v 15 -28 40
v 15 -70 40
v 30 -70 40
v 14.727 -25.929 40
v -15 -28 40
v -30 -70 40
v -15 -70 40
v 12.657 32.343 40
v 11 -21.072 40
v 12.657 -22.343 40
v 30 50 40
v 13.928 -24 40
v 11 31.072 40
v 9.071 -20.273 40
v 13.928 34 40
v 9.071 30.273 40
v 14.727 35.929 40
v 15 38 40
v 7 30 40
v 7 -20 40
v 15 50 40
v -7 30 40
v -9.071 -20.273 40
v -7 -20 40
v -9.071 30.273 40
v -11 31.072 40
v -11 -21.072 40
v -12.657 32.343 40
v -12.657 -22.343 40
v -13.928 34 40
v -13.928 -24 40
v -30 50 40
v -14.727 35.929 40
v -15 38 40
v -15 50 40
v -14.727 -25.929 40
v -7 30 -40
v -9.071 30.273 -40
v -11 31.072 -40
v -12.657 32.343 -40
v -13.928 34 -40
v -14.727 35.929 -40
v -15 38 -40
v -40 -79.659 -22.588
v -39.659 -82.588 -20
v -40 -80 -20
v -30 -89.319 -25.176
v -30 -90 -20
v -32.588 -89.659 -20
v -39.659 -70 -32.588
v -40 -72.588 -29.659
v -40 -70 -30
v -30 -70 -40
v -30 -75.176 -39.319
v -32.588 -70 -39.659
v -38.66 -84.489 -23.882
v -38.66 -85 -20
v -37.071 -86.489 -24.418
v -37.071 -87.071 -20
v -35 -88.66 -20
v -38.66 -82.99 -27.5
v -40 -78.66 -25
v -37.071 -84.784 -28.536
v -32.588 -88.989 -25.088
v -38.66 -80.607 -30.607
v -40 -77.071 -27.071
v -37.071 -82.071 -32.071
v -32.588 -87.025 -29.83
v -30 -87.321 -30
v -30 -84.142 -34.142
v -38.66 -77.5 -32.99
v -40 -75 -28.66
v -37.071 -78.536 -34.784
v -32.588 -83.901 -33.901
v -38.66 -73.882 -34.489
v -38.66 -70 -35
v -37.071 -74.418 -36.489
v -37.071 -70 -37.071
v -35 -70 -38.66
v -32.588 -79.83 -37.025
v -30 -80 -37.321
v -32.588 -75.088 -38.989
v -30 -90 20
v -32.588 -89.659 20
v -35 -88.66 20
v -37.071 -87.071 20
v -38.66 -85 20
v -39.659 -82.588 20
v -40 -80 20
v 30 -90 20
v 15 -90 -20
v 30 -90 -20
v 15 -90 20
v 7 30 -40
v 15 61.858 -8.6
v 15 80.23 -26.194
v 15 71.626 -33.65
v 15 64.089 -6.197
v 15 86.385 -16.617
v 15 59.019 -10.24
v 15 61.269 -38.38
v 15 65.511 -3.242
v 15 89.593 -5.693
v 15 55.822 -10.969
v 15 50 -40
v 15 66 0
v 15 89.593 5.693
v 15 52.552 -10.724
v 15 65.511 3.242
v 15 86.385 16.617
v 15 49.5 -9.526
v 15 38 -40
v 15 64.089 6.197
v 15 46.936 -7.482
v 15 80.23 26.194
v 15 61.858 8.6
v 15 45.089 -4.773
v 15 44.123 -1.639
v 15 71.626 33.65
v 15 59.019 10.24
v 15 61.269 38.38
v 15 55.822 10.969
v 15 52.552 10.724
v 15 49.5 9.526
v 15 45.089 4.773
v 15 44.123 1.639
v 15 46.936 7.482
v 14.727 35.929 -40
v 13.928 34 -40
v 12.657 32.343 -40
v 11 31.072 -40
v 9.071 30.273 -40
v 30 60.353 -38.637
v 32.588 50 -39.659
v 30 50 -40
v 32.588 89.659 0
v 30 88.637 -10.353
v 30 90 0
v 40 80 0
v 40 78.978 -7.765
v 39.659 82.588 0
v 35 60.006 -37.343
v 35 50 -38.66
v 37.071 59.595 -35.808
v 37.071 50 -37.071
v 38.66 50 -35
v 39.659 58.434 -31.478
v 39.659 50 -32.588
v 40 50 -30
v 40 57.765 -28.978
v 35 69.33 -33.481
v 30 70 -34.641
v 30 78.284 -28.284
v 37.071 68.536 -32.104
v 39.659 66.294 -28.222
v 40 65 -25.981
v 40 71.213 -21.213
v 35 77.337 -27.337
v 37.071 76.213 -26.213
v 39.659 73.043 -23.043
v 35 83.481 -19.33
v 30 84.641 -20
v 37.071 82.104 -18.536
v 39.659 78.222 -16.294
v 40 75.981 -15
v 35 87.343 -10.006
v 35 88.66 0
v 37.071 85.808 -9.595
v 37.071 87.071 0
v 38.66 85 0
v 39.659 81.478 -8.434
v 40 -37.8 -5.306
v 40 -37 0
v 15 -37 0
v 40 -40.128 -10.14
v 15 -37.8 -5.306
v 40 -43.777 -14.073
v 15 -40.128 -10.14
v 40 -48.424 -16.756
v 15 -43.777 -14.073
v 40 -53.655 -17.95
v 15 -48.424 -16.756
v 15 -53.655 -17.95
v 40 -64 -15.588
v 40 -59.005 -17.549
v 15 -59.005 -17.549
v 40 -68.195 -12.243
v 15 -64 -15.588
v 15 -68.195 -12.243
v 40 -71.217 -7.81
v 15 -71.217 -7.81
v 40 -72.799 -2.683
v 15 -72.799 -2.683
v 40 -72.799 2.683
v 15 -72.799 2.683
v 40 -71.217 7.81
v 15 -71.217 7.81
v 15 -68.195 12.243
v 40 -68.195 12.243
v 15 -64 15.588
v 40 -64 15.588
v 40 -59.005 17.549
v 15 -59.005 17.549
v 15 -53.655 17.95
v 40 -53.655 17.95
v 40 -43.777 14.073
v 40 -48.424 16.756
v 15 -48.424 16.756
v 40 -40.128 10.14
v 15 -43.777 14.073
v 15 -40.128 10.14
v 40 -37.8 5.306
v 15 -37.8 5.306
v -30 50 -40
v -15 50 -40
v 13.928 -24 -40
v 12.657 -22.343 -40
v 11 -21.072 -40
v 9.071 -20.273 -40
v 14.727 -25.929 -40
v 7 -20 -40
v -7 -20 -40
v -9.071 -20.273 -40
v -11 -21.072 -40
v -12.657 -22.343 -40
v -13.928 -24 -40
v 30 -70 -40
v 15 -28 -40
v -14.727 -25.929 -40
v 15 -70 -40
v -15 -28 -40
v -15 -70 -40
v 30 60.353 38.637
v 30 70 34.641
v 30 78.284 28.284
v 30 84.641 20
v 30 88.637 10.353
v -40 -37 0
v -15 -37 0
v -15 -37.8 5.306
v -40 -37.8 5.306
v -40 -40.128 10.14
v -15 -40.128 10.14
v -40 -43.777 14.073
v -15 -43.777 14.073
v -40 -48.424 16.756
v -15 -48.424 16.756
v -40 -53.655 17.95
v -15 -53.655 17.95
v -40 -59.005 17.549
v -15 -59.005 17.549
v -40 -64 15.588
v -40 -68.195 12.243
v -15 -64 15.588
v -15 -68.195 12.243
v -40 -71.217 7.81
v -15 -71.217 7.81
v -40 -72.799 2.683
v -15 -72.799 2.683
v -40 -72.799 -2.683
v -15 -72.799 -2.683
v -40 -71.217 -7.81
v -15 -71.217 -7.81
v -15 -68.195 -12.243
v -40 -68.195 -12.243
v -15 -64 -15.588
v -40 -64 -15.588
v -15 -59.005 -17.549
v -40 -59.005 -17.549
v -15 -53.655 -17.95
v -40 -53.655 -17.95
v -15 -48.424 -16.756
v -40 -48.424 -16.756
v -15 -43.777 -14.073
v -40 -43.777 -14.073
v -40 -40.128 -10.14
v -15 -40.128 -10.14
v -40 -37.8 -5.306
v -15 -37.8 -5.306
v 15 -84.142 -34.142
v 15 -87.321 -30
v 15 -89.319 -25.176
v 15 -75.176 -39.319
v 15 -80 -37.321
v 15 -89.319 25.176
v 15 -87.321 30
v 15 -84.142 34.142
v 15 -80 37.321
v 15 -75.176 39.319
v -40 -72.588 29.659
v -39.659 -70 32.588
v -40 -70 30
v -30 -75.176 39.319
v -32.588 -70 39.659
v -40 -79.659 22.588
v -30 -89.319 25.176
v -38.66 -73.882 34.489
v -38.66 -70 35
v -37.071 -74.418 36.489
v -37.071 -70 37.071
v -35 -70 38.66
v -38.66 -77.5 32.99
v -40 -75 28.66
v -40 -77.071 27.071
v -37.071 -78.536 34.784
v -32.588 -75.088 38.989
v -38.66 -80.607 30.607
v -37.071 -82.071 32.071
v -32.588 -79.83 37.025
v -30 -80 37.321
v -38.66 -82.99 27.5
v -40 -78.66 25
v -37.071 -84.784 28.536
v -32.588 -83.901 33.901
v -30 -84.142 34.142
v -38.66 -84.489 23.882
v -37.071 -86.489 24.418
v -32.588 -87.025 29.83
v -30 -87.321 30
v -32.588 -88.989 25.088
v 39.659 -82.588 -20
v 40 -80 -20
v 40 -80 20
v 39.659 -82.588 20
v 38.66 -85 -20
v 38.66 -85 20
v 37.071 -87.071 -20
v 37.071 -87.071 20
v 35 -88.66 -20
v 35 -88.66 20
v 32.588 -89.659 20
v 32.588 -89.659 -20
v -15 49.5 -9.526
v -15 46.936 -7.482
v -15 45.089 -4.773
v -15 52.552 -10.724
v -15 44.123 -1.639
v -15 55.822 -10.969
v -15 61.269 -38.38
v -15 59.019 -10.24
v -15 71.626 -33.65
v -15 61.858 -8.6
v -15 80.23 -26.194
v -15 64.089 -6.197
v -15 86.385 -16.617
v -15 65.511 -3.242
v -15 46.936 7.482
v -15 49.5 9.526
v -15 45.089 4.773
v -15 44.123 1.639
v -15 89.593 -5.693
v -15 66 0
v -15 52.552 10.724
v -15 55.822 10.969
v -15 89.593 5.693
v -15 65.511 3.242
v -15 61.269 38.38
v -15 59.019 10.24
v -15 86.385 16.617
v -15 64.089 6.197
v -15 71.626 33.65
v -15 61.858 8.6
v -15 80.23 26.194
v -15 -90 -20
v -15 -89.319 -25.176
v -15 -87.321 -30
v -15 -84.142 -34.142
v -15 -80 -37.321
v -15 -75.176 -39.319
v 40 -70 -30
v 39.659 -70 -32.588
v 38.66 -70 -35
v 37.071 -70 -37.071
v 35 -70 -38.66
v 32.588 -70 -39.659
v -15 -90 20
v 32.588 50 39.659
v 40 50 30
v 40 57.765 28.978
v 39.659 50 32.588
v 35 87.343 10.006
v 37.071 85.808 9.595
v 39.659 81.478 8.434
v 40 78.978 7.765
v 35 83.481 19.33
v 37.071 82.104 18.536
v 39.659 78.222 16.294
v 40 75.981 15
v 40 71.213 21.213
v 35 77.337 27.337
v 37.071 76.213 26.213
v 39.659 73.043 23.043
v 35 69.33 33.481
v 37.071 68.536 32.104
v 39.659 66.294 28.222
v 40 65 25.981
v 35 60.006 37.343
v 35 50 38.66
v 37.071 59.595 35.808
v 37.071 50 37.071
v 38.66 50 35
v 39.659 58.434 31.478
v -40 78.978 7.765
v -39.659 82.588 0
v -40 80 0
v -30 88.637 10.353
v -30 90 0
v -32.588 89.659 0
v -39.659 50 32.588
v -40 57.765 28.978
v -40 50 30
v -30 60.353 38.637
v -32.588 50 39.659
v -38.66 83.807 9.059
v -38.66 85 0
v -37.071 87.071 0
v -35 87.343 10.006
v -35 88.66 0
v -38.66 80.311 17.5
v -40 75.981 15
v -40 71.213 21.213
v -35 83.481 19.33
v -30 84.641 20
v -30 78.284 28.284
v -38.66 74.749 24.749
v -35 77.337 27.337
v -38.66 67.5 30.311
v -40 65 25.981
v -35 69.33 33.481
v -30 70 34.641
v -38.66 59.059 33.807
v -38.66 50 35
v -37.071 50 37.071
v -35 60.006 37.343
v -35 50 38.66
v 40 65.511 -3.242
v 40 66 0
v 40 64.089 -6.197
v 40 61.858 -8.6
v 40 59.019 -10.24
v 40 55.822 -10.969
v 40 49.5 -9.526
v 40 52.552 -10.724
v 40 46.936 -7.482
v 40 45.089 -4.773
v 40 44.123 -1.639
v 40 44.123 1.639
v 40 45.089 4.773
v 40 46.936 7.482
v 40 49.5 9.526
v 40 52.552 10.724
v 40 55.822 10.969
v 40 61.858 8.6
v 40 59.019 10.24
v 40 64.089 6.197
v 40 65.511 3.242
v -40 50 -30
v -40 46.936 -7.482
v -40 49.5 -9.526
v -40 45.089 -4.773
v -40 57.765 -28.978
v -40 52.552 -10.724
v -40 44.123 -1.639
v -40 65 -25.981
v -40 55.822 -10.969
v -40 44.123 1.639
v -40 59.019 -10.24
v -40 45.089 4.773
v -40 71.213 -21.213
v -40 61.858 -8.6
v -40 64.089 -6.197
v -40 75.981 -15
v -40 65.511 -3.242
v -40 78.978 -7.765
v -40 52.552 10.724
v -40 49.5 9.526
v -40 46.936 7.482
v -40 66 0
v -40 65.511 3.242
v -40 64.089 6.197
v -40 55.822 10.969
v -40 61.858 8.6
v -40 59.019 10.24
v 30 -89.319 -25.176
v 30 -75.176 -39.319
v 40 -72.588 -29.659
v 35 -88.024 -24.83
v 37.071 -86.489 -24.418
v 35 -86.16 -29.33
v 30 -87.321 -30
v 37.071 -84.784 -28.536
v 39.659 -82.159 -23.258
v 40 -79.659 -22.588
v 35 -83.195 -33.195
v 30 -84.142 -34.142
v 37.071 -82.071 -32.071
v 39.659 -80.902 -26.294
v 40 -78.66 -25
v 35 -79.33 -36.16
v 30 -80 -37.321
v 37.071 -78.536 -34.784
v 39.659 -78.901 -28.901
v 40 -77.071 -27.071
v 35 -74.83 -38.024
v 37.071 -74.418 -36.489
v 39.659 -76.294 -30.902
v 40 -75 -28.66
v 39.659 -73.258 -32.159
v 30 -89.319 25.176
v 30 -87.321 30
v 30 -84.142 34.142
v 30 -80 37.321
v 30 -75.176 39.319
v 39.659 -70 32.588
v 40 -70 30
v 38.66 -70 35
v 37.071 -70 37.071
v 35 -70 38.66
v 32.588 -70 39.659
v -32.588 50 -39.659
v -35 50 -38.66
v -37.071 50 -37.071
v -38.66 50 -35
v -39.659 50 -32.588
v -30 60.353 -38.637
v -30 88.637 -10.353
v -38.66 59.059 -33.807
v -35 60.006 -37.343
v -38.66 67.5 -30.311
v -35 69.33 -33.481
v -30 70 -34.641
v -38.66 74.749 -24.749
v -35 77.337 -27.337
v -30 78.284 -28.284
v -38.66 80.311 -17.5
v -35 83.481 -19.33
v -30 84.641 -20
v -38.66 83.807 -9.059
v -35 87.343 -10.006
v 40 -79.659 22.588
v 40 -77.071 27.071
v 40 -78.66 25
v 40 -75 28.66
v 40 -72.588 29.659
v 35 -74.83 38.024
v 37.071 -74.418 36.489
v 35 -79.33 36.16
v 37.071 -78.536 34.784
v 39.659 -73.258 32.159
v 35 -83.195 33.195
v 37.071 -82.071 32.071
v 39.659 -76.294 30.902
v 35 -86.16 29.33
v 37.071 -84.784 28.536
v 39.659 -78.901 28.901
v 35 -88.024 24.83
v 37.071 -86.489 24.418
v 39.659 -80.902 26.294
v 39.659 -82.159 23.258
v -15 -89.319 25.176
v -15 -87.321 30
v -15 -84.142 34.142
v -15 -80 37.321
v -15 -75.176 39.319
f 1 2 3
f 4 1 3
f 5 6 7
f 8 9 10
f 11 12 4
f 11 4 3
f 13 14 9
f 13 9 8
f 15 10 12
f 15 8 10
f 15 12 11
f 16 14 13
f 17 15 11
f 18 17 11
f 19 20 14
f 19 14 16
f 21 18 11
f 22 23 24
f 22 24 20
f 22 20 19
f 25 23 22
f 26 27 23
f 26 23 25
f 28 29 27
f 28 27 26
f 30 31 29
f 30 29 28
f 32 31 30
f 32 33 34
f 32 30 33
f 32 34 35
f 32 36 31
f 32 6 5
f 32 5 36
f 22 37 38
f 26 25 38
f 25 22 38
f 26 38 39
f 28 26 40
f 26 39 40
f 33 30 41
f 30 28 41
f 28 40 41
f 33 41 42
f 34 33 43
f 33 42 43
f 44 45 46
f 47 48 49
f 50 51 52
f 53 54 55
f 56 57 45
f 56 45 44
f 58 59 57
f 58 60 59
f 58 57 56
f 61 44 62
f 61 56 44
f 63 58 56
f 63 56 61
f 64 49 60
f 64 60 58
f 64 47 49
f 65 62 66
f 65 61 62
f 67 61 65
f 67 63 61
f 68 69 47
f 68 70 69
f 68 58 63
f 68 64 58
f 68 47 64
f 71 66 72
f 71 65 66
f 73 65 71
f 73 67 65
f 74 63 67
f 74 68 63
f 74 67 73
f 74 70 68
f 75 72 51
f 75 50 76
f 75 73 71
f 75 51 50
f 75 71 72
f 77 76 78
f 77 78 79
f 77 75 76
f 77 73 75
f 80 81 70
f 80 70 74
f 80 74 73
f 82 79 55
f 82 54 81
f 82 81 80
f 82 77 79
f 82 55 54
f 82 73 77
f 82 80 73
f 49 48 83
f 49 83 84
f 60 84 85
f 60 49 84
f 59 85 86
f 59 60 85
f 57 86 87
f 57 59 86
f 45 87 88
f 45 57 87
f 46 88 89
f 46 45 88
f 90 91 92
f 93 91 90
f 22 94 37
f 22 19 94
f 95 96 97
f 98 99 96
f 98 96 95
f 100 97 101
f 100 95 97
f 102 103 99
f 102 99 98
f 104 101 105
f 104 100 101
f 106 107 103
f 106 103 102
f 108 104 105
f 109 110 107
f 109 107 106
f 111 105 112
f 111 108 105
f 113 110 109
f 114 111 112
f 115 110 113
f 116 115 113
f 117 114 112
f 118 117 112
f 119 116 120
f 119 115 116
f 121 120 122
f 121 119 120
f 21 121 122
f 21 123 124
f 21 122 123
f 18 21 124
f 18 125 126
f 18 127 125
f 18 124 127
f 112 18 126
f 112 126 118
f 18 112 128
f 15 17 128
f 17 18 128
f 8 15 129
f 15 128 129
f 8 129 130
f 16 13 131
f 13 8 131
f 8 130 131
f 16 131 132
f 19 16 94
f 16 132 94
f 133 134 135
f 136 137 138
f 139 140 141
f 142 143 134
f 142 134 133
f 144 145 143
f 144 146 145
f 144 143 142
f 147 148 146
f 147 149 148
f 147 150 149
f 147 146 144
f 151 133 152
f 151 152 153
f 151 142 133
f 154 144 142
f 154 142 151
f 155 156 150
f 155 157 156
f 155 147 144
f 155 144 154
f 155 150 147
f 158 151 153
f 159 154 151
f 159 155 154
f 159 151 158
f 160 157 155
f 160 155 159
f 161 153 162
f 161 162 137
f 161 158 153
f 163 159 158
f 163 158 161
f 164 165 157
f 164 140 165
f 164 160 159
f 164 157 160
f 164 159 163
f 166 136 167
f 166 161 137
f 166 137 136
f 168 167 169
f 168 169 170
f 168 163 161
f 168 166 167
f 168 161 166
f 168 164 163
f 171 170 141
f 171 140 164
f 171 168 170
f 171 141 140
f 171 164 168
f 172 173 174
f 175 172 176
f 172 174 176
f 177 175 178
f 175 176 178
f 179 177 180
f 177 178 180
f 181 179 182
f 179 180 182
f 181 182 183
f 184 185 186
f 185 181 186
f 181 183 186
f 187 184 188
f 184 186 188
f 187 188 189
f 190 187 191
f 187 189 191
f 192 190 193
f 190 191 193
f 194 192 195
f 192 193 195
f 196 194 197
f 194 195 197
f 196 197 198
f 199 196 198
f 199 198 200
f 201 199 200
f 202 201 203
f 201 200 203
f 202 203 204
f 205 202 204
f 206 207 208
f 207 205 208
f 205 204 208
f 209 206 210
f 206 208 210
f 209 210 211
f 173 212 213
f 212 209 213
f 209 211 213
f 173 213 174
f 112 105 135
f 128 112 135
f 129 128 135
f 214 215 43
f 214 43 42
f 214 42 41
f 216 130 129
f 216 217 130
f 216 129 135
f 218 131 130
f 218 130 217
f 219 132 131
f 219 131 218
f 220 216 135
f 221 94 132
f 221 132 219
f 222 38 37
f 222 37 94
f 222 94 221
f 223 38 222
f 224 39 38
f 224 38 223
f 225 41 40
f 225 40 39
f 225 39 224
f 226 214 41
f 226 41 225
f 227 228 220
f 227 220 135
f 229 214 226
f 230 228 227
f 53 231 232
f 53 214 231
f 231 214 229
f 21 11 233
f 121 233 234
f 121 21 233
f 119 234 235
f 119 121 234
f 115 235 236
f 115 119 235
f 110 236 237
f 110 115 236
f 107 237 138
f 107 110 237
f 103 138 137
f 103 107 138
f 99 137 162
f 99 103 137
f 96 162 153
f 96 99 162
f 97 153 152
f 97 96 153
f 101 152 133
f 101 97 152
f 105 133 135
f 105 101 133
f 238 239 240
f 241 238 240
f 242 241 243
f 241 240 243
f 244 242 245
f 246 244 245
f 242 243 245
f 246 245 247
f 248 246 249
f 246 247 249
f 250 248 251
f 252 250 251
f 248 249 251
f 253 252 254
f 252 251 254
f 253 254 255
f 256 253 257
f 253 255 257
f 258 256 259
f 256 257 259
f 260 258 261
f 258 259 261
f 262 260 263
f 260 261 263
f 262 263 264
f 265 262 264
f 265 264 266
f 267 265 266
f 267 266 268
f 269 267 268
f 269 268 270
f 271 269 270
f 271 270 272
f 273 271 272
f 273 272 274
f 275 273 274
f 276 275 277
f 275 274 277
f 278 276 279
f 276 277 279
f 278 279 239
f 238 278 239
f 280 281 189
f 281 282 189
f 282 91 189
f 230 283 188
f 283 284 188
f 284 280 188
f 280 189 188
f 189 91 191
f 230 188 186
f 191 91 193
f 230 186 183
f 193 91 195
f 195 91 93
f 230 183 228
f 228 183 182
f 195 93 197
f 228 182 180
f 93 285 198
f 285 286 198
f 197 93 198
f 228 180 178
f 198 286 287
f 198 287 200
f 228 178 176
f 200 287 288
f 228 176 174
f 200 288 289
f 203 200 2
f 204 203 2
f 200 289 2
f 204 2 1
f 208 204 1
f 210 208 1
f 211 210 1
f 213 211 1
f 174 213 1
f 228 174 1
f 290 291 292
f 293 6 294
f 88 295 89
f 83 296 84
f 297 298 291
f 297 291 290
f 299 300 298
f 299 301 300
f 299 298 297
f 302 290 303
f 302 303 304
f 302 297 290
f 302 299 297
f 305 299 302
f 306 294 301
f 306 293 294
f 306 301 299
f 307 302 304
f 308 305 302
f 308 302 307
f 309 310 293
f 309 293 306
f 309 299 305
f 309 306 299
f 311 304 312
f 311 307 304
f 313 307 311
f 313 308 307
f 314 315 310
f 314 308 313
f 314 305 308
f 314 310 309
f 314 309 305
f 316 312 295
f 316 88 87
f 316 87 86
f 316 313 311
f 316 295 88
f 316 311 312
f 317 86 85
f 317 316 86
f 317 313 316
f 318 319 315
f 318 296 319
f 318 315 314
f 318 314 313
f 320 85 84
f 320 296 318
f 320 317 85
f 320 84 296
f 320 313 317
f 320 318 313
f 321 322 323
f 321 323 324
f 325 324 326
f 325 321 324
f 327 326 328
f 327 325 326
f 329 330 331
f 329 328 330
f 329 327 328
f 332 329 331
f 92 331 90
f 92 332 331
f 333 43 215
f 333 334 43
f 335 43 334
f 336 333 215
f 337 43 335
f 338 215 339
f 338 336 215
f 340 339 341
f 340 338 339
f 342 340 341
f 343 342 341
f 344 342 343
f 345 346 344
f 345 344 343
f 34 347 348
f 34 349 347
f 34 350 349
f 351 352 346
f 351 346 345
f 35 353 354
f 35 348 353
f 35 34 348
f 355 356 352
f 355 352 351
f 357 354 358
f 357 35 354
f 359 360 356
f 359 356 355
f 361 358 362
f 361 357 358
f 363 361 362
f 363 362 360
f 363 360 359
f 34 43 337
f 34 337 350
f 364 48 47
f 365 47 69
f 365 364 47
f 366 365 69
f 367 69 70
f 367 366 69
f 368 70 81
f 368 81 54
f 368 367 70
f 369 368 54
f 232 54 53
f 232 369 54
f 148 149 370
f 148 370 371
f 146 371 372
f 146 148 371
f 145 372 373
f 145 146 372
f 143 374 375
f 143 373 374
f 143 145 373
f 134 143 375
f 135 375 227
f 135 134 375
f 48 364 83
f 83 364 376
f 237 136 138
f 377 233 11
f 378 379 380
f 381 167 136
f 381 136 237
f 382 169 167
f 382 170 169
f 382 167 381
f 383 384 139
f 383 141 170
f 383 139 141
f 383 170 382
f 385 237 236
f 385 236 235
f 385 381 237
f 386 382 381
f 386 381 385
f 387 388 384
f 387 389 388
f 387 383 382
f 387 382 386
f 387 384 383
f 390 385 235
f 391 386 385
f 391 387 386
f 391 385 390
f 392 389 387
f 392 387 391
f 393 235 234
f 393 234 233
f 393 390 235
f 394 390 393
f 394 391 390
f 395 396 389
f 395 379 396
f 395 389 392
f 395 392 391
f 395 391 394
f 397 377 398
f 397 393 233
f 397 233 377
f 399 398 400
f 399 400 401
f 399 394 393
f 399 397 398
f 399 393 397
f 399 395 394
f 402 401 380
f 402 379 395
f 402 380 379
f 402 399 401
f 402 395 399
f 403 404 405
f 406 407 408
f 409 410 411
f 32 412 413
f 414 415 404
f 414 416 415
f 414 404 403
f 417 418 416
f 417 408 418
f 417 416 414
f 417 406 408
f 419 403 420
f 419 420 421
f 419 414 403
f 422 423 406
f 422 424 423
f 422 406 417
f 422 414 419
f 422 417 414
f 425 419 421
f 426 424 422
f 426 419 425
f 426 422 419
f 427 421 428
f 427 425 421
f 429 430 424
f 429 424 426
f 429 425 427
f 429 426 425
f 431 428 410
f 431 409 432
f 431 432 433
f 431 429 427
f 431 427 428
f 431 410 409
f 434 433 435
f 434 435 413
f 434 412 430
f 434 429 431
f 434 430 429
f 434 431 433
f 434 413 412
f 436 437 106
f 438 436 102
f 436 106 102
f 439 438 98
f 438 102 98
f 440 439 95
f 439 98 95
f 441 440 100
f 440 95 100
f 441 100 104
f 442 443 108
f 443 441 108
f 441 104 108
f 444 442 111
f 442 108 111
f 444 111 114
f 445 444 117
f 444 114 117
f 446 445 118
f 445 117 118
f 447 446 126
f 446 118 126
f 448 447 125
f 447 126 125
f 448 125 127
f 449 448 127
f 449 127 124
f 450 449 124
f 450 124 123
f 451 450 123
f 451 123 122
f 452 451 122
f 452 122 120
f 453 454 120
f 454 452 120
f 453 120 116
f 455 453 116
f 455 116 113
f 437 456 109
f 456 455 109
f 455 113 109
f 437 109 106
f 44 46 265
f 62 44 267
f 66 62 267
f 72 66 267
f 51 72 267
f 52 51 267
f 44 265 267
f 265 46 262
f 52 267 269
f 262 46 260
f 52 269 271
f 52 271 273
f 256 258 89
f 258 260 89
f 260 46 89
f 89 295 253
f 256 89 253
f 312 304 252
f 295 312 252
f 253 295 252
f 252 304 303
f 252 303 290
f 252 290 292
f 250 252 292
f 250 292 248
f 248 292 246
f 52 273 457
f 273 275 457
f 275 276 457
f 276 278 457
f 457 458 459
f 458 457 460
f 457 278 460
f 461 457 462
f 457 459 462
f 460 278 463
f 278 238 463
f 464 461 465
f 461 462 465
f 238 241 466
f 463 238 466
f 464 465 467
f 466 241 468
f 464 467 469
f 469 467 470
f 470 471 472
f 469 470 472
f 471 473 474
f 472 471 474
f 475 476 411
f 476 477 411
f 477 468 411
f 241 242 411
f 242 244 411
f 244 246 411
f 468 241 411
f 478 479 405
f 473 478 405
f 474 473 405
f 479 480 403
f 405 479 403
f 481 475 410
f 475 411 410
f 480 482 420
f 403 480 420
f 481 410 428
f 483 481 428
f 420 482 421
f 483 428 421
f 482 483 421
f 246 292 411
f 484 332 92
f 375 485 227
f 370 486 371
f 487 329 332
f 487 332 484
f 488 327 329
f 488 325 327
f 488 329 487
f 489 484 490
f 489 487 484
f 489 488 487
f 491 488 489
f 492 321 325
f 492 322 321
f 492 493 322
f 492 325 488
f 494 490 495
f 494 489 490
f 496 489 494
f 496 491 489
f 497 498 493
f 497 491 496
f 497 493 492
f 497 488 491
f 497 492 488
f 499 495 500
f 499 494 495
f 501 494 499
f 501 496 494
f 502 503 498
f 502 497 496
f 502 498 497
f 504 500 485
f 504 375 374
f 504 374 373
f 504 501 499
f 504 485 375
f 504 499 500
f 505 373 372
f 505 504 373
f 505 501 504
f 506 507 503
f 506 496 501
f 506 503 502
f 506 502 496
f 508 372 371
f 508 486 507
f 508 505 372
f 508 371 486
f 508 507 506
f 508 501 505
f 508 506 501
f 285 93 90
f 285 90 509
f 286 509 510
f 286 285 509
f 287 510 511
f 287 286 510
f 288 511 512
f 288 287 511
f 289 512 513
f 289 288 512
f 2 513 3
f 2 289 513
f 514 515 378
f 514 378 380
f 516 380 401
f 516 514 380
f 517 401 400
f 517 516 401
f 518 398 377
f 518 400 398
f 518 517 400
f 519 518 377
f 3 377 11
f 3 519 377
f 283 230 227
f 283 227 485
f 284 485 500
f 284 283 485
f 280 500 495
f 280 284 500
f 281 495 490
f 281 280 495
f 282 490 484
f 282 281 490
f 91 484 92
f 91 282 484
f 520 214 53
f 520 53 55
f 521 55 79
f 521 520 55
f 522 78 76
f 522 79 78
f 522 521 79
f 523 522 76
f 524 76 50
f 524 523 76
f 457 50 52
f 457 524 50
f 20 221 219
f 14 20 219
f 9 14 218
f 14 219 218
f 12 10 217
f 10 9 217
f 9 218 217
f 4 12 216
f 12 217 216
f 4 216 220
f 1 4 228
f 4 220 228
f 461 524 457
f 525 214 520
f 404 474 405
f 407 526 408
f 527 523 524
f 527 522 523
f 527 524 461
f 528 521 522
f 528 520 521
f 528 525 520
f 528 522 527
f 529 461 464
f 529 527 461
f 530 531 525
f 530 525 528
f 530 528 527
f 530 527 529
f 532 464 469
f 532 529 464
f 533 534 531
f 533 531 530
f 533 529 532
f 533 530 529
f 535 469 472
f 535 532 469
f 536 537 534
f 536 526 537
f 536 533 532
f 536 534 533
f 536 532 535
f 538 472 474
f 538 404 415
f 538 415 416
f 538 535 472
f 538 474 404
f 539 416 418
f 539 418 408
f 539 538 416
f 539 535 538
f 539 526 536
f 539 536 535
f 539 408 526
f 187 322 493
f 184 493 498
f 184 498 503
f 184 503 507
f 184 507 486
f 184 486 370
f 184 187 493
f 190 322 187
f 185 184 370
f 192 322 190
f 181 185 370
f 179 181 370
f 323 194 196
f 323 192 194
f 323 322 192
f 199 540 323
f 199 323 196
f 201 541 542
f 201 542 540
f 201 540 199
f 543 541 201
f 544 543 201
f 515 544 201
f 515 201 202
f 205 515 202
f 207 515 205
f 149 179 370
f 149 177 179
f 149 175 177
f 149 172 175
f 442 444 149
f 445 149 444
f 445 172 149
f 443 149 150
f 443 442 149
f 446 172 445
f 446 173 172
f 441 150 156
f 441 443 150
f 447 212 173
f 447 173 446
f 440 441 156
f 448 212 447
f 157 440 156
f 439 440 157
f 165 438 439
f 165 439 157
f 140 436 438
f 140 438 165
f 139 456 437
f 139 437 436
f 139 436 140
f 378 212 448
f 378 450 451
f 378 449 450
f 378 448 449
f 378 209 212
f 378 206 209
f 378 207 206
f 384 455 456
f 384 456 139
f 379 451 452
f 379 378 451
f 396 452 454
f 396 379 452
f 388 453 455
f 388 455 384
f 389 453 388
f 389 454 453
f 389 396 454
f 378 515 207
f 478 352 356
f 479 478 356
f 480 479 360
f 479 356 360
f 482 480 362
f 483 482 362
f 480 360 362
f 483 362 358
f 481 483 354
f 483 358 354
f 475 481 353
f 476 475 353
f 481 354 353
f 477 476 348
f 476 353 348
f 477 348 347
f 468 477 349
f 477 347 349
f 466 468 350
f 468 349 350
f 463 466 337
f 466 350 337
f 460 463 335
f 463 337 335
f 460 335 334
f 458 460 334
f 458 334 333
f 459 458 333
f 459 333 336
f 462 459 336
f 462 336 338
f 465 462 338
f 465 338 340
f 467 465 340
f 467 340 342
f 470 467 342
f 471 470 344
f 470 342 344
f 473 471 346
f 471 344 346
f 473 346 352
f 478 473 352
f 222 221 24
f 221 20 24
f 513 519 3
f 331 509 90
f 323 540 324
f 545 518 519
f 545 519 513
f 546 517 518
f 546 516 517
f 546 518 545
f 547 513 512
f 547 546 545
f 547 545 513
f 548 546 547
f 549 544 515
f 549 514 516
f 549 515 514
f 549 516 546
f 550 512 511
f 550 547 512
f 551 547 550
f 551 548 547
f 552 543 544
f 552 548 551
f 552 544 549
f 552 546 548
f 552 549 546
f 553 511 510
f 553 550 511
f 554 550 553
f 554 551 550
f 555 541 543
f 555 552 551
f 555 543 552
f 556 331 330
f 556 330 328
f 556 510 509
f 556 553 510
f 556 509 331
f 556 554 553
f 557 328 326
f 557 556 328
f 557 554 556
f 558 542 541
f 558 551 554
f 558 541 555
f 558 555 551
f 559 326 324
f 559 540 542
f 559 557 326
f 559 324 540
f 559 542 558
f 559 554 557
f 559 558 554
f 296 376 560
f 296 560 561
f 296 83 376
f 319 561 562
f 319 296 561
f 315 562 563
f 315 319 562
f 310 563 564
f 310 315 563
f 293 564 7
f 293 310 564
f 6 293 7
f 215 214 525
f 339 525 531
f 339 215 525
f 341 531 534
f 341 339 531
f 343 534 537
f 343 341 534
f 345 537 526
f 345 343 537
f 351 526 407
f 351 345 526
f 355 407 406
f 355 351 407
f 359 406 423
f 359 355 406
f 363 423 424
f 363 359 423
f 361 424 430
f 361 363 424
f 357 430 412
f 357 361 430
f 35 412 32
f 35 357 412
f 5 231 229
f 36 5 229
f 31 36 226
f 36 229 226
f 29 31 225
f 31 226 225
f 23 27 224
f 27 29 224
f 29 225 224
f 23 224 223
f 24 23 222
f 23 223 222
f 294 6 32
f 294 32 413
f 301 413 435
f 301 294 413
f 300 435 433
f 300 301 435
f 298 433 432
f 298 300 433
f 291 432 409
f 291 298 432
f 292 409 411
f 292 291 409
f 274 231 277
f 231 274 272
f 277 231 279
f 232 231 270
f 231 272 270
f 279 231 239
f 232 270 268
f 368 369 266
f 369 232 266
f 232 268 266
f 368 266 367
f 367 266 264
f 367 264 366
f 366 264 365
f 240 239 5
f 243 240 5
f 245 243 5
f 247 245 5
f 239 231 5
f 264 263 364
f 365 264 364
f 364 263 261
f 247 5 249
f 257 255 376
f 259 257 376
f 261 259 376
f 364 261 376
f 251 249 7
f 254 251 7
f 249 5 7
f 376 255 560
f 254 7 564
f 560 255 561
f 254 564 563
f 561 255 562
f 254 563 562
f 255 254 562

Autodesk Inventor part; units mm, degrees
ref_plane "YZ Plane" through (0, 0, 0) normal (1, 0, 0) x (0, 1, 0)
ref_plane "XZ Plane" through (0, 0, 0) normal (0, 1, 0) x (-1, 0, 0)
ref_plane "XY Plane" through (0, 0, 0) normal (0, 0, 1) x (1, 0, 0)
sketch "Sketch1" plane through (0, 0, 0) normal (1, 0, 0) x (0, 1, 0)
  line L0 (-70, 40) -> (50, 40)
  line L1 (90, 0) -> (90, 0)
  line L2 (50, -40) -> (-70, -40)
  line L3 (-90, -20) -> (-90, 20)
  line L4 (-90, 40) -> (90, -40) construction
  line L5 (90, 40) -> (-90, -40) construction
  circle A0 centre (55, 0) radius 11
  line L6 (0, 0) -> (0, -40.3764)
  circle A1 centre (-55, 0) radius 18
  arc A2 (90, 0) -> (50, 40) centre (50, 0) ccw
  arc A3 (50, -40) -> (90, 0) centre (50, 0) ccw
  arc A4 (-70, 40) -> (-90, 20) centre (-70, 20) ccw
  arc A5 (-90, -20) -> (-70, -40) centre (-70, -20) ccw
  dimension "d0" = 180
  dimension "d1" = 22
  dimension "d2" = 36
  dimension "d3" = 110
  dimension "d4" = 80
  dimension "d5" = 40
  dimension "d6" = 20
extrude "Extrusion1" add sketch "Sketch1" along normal mid plane 80
fillet "Fillet1" radius 10 12 edges at (40, -84.1421, 34.1421) (40, -90, 0) (40, -84.1421, -34.1421) (40, -10, -40) (40, 78.2843, 28.2843) (40, -10, 40) (-40, 78.2843, -28.2843) (-40, -10, -40) (-40, -84.1421, -34.1421) (-40, -90, 0) (-40, -84.1421, 34.1421) (-40, -10, 40)
sketch "Sketch2" plane through (-30, -70, 40) normal (0, 0, 1) x (1, 0, 0)
  line L0 (0, 160) -> (60, 160) projected
  line L1 (15, 160) -> (45, 160)
  line L2 (45, 160) -> (45, 100)
  line L3 (45, 100) -> (15, 100)
  line L4 (15, 100) -> (15, 160)
  line L5 (15, -20) -> (45, -20)
  line L6 (45, -20) -> (45, 50)
  line L7 (45, 50) -> (15, 50)
  line L8 (15, 50) -> (15, -20)
  line L9 (0, -20) -> (60, -20) projected
  line L10 (30, 160) -> (30, 100) construction
  point P0 (30, 70)
  dimension "d10" = 60
  dimension "d11" = 70
  dimension "d12" = 30
extrude "Extrusion2" cut sketch "Sketch2" against normal through all
fillet "Fillet2" radius 8 4 edges at (-15, 30, 0) (15, 30, 0) (-15, -20, 0) (15, -20, 0)
equation "\"d5\" = 0.5 * d4"
properties part number "Link_Tensionador"
